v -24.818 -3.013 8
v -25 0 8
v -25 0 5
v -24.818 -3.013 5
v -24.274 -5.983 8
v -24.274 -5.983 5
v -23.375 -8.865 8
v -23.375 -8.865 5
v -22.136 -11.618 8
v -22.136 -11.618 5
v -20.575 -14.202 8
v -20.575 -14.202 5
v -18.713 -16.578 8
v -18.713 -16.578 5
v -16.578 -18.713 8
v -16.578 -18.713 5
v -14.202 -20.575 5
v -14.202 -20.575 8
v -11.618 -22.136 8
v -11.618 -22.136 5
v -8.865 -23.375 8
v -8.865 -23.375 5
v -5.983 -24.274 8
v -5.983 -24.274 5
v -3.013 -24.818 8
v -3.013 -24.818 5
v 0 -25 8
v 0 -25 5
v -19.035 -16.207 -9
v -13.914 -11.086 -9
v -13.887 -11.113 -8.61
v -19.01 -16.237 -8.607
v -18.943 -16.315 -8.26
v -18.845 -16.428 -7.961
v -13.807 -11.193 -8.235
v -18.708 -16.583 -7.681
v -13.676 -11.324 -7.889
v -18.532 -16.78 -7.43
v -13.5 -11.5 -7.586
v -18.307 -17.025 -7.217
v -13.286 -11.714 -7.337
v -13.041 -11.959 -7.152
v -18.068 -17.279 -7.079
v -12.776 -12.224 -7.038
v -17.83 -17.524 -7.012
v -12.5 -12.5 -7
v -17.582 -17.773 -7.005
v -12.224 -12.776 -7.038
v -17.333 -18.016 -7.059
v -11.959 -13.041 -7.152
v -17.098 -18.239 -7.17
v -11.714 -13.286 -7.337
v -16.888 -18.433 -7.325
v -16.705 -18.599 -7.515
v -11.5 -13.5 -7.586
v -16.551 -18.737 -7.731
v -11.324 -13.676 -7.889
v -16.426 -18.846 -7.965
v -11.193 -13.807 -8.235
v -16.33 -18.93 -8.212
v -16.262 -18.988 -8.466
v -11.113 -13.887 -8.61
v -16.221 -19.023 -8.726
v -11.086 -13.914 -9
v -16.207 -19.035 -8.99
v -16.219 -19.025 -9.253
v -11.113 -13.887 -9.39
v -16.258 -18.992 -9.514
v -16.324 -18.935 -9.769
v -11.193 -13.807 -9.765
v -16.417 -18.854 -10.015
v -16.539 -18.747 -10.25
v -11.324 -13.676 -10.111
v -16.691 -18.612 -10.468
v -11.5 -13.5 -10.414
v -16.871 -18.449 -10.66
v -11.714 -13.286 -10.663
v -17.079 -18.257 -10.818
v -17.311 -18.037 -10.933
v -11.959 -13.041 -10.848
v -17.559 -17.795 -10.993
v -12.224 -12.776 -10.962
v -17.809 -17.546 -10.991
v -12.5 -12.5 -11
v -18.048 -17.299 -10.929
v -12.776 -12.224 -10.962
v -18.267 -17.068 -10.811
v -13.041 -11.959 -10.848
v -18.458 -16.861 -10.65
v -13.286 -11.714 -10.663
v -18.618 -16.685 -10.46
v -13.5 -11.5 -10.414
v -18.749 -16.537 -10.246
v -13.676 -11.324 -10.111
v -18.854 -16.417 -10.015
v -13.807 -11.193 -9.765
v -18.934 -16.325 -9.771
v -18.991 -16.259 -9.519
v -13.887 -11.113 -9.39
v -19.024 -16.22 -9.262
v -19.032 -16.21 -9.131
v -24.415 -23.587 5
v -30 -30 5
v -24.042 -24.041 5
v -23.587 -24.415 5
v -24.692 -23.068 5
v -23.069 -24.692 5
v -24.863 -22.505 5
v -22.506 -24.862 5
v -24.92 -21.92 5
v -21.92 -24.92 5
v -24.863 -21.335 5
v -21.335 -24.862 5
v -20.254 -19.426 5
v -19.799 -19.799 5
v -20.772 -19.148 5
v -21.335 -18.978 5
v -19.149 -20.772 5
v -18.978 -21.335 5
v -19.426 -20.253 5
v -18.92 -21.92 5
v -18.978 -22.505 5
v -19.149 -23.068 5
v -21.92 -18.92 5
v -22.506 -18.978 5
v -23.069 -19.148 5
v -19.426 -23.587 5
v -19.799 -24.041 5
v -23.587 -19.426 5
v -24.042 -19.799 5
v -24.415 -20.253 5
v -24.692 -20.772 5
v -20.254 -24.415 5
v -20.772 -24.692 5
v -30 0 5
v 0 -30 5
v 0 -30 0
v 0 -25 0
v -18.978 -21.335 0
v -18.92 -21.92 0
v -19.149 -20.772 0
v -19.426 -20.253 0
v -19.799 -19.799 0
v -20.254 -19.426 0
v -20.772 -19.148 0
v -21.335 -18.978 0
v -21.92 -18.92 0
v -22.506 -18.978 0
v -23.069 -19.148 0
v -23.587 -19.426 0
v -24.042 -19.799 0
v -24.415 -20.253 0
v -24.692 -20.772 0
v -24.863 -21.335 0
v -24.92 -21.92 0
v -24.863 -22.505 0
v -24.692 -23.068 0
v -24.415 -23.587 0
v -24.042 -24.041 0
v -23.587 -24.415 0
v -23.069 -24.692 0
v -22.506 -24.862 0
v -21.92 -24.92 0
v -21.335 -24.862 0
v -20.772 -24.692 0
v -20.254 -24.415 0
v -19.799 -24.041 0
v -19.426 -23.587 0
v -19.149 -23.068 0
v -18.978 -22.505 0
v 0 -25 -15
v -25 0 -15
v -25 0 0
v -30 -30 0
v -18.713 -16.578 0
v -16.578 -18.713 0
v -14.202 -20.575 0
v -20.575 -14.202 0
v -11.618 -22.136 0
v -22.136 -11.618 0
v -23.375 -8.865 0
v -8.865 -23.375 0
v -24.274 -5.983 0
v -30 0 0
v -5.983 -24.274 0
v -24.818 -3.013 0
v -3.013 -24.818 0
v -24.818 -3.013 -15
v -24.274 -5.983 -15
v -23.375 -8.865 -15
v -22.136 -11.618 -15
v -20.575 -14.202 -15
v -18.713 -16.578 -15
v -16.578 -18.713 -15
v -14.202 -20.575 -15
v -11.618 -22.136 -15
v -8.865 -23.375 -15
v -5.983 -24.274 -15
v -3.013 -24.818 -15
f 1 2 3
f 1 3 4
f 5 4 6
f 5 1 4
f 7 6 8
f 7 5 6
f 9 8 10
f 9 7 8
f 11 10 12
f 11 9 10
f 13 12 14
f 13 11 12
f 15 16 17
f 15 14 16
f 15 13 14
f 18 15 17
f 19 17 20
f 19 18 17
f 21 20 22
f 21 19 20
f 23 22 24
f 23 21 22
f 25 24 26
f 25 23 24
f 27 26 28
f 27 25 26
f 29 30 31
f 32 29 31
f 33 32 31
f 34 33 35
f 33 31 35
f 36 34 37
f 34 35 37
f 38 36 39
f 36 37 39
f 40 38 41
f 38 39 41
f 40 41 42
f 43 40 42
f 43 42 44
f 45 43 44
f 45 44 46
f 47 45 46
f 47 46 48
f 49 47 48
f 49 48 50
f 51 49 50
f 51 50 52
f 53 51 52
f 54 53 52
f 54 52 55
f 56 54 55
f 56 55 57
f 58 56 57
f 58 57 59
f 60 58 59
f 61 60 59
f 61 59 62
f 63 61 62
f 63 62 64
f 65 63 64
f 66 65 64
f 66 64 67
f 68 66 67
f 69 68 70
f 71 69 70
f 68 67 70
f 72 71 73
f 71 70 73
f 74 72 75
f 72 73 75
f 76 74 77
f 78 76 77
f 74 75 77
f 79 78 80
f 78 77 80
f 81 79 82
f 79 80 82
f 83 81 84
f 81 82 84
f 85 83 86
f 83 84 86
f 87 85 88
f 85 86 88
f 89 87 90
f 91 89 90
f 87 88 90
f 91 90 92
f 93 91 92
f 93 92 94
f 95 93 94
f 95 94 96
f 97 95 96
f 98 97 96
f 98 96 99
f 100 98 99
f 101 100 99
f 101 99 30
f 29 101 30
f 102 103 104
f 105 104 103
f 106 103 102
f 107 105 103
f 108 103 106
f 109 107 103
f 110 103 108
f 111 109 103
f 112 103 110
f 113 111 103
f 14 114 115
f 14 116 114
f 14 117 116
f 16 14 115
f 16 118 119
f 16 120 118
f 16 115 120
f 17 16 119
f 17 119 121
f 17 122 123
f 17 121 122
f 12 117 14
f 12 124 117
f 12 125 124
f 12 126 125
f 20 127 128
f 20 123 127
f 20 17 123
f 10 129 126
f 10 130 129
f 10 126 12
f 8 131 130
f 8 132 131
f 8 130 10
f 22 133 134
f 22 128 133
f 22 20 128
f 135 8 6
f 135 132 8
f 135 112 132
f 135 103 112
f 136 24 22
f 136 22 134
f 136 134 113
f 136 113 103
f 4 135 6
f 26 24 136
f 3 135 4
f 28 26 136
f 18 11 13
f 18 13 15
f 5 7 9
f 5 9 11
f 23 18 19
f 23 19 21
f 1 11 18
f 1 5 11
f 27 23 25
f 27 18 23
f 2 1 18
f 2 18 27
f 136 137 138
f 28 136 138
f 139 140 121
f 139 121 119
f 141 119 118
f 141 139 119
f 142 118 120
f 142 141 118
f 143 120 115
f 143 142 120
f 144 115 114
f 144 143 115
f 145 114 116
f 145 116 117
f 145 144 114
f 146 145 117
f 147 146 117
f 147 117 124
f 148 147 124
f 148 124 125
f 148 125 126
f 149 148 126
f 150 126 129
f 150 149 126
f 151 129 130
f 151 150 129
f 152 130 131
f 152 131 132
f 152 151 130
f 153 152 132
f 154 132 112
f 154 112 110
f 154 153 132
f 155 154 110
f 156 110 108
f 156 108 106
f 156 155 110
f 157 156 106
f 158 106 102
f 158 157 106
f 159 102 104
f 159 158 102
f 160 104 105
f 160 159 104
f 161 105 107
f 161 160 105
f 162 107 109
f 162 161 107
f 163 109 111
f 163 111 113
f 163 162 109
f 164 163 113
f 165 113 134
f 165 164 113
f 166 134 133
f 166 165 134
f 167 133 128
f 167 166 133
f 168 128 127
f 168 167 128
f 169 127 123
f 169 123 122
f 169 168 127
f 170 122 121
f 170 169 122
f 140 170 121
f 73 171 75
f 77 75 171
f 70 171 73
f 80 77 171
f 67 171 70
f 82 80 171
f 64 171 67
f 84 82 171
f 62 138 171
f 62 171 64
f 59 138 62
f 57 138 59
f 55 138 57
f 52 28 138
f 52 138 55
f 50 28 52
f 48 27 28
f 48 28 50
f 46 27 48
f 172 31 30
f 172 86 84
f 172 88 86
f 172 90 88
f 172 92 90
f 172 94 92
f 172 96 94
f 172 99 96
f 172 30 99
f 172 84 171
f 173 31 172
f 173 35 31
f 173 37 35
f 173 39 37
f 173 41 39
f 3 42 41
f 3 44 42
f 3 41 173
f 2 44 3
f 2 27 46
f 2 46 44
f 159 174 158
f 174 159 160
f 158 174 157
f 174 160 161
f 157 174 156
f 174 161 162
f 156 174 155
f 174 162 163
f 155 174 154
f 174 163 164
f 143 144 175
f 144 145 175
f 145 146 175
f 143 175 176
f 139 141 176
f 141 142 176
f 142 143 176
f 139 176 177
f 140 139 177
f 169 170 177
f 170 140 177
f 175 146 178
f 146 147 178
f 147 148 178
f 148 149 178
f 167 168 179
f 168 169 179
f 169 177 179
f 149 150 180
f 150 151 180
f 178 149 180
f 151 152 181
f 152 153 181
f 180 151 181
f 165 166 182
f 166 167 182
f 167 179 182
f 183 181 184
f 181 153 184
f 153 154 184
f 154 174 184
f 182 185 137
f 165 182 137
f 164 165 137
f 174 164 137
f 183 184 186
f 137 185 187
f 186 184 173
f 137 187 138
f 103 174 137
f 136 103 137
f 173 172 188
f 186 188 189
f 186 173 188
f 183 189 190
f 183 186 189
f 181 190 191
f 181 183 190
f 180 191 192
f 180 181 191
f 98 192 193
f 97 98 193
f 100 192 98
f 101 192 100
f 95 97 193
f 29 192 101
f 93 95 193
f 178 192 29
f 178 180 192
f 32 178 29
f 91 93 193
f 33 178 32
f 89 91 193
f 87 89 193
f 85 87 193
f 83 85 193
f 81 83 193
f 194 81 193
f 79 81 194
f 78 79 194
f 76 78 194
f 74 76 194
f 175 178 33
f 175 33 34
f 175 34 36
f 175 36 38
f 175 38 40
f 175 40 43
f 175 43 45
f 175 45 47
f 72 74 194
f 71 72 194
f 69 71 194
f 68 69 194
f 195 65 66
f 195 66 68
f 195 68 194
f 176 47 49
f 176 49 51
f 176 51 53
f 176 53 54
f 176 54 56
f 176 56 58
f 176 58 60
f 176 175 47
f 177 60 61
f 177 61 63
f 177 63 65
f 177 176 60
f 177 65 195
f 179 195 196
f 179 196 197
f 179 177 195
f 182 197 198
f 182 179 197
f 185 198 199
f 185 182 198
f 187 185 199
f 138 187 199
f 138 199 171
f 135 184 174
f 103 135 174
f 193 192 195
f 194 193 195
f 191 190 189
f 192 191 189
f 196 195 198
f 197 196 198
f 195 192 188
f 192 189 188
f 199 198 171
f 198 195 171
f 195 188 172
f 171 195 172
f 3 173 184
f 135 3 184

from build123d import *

# Parameters (mm, degrees)
F1_DEPTH      = 8
F1_DEPTH_BACK = 15
F0_R          = 3
F2_DEPTH      = 5
F3_R          = 2
F4_DEPTH      = 25


with BuildPart() as f1:
    # F0 (on Top) → F1 (new body, two sides)
    with BuildSketch(Plane.XY) as f1_sk:
        with BuildLine():
            Line((0, -25), (-25, 0))
            ThreePointArc((-25, 0), (-17.67767, -17.67767), (0, -25))
        make_face()
    extrude(amount=F1_DEPTH)
    extrude(f1_sk.sketch, amount=-F1_DEPTH_BACK)

    # F0 (on Top) → F2 (join)
    with BuildSketch(Plane.XY):
        with BuildLine():
            Line((-25, 0), (-30, 0))
            Line((-30, 0), (-30, -30))
            Line((-30, -30), (0, -30))
            Line((0, -30), (0, -25))
            ThreePointArc((0, -25), (-17.67767, -17.67767), (-25, 0))
        make_face()
        with Locations((-21.9205, -21.92012)):
            Circle(F0_R, mode=Mode.SUBTRACT)
    extrude(amount=F2_DEPTH)

    # F3 (on face) → F4 (cut)
    with BuildSketch(Plane(origin=(-12.5, -12.5, 0), x_dir=(-0.707107, 0.707107, 0), z_dir=(0.707107, 0.707107, 0))):
        with Locations((0, -9)):
            Circle(F3_R)
    extrude(amount=-F4_DEPTH, mode=Mode.SUBTRACT)


solid = f1.part
